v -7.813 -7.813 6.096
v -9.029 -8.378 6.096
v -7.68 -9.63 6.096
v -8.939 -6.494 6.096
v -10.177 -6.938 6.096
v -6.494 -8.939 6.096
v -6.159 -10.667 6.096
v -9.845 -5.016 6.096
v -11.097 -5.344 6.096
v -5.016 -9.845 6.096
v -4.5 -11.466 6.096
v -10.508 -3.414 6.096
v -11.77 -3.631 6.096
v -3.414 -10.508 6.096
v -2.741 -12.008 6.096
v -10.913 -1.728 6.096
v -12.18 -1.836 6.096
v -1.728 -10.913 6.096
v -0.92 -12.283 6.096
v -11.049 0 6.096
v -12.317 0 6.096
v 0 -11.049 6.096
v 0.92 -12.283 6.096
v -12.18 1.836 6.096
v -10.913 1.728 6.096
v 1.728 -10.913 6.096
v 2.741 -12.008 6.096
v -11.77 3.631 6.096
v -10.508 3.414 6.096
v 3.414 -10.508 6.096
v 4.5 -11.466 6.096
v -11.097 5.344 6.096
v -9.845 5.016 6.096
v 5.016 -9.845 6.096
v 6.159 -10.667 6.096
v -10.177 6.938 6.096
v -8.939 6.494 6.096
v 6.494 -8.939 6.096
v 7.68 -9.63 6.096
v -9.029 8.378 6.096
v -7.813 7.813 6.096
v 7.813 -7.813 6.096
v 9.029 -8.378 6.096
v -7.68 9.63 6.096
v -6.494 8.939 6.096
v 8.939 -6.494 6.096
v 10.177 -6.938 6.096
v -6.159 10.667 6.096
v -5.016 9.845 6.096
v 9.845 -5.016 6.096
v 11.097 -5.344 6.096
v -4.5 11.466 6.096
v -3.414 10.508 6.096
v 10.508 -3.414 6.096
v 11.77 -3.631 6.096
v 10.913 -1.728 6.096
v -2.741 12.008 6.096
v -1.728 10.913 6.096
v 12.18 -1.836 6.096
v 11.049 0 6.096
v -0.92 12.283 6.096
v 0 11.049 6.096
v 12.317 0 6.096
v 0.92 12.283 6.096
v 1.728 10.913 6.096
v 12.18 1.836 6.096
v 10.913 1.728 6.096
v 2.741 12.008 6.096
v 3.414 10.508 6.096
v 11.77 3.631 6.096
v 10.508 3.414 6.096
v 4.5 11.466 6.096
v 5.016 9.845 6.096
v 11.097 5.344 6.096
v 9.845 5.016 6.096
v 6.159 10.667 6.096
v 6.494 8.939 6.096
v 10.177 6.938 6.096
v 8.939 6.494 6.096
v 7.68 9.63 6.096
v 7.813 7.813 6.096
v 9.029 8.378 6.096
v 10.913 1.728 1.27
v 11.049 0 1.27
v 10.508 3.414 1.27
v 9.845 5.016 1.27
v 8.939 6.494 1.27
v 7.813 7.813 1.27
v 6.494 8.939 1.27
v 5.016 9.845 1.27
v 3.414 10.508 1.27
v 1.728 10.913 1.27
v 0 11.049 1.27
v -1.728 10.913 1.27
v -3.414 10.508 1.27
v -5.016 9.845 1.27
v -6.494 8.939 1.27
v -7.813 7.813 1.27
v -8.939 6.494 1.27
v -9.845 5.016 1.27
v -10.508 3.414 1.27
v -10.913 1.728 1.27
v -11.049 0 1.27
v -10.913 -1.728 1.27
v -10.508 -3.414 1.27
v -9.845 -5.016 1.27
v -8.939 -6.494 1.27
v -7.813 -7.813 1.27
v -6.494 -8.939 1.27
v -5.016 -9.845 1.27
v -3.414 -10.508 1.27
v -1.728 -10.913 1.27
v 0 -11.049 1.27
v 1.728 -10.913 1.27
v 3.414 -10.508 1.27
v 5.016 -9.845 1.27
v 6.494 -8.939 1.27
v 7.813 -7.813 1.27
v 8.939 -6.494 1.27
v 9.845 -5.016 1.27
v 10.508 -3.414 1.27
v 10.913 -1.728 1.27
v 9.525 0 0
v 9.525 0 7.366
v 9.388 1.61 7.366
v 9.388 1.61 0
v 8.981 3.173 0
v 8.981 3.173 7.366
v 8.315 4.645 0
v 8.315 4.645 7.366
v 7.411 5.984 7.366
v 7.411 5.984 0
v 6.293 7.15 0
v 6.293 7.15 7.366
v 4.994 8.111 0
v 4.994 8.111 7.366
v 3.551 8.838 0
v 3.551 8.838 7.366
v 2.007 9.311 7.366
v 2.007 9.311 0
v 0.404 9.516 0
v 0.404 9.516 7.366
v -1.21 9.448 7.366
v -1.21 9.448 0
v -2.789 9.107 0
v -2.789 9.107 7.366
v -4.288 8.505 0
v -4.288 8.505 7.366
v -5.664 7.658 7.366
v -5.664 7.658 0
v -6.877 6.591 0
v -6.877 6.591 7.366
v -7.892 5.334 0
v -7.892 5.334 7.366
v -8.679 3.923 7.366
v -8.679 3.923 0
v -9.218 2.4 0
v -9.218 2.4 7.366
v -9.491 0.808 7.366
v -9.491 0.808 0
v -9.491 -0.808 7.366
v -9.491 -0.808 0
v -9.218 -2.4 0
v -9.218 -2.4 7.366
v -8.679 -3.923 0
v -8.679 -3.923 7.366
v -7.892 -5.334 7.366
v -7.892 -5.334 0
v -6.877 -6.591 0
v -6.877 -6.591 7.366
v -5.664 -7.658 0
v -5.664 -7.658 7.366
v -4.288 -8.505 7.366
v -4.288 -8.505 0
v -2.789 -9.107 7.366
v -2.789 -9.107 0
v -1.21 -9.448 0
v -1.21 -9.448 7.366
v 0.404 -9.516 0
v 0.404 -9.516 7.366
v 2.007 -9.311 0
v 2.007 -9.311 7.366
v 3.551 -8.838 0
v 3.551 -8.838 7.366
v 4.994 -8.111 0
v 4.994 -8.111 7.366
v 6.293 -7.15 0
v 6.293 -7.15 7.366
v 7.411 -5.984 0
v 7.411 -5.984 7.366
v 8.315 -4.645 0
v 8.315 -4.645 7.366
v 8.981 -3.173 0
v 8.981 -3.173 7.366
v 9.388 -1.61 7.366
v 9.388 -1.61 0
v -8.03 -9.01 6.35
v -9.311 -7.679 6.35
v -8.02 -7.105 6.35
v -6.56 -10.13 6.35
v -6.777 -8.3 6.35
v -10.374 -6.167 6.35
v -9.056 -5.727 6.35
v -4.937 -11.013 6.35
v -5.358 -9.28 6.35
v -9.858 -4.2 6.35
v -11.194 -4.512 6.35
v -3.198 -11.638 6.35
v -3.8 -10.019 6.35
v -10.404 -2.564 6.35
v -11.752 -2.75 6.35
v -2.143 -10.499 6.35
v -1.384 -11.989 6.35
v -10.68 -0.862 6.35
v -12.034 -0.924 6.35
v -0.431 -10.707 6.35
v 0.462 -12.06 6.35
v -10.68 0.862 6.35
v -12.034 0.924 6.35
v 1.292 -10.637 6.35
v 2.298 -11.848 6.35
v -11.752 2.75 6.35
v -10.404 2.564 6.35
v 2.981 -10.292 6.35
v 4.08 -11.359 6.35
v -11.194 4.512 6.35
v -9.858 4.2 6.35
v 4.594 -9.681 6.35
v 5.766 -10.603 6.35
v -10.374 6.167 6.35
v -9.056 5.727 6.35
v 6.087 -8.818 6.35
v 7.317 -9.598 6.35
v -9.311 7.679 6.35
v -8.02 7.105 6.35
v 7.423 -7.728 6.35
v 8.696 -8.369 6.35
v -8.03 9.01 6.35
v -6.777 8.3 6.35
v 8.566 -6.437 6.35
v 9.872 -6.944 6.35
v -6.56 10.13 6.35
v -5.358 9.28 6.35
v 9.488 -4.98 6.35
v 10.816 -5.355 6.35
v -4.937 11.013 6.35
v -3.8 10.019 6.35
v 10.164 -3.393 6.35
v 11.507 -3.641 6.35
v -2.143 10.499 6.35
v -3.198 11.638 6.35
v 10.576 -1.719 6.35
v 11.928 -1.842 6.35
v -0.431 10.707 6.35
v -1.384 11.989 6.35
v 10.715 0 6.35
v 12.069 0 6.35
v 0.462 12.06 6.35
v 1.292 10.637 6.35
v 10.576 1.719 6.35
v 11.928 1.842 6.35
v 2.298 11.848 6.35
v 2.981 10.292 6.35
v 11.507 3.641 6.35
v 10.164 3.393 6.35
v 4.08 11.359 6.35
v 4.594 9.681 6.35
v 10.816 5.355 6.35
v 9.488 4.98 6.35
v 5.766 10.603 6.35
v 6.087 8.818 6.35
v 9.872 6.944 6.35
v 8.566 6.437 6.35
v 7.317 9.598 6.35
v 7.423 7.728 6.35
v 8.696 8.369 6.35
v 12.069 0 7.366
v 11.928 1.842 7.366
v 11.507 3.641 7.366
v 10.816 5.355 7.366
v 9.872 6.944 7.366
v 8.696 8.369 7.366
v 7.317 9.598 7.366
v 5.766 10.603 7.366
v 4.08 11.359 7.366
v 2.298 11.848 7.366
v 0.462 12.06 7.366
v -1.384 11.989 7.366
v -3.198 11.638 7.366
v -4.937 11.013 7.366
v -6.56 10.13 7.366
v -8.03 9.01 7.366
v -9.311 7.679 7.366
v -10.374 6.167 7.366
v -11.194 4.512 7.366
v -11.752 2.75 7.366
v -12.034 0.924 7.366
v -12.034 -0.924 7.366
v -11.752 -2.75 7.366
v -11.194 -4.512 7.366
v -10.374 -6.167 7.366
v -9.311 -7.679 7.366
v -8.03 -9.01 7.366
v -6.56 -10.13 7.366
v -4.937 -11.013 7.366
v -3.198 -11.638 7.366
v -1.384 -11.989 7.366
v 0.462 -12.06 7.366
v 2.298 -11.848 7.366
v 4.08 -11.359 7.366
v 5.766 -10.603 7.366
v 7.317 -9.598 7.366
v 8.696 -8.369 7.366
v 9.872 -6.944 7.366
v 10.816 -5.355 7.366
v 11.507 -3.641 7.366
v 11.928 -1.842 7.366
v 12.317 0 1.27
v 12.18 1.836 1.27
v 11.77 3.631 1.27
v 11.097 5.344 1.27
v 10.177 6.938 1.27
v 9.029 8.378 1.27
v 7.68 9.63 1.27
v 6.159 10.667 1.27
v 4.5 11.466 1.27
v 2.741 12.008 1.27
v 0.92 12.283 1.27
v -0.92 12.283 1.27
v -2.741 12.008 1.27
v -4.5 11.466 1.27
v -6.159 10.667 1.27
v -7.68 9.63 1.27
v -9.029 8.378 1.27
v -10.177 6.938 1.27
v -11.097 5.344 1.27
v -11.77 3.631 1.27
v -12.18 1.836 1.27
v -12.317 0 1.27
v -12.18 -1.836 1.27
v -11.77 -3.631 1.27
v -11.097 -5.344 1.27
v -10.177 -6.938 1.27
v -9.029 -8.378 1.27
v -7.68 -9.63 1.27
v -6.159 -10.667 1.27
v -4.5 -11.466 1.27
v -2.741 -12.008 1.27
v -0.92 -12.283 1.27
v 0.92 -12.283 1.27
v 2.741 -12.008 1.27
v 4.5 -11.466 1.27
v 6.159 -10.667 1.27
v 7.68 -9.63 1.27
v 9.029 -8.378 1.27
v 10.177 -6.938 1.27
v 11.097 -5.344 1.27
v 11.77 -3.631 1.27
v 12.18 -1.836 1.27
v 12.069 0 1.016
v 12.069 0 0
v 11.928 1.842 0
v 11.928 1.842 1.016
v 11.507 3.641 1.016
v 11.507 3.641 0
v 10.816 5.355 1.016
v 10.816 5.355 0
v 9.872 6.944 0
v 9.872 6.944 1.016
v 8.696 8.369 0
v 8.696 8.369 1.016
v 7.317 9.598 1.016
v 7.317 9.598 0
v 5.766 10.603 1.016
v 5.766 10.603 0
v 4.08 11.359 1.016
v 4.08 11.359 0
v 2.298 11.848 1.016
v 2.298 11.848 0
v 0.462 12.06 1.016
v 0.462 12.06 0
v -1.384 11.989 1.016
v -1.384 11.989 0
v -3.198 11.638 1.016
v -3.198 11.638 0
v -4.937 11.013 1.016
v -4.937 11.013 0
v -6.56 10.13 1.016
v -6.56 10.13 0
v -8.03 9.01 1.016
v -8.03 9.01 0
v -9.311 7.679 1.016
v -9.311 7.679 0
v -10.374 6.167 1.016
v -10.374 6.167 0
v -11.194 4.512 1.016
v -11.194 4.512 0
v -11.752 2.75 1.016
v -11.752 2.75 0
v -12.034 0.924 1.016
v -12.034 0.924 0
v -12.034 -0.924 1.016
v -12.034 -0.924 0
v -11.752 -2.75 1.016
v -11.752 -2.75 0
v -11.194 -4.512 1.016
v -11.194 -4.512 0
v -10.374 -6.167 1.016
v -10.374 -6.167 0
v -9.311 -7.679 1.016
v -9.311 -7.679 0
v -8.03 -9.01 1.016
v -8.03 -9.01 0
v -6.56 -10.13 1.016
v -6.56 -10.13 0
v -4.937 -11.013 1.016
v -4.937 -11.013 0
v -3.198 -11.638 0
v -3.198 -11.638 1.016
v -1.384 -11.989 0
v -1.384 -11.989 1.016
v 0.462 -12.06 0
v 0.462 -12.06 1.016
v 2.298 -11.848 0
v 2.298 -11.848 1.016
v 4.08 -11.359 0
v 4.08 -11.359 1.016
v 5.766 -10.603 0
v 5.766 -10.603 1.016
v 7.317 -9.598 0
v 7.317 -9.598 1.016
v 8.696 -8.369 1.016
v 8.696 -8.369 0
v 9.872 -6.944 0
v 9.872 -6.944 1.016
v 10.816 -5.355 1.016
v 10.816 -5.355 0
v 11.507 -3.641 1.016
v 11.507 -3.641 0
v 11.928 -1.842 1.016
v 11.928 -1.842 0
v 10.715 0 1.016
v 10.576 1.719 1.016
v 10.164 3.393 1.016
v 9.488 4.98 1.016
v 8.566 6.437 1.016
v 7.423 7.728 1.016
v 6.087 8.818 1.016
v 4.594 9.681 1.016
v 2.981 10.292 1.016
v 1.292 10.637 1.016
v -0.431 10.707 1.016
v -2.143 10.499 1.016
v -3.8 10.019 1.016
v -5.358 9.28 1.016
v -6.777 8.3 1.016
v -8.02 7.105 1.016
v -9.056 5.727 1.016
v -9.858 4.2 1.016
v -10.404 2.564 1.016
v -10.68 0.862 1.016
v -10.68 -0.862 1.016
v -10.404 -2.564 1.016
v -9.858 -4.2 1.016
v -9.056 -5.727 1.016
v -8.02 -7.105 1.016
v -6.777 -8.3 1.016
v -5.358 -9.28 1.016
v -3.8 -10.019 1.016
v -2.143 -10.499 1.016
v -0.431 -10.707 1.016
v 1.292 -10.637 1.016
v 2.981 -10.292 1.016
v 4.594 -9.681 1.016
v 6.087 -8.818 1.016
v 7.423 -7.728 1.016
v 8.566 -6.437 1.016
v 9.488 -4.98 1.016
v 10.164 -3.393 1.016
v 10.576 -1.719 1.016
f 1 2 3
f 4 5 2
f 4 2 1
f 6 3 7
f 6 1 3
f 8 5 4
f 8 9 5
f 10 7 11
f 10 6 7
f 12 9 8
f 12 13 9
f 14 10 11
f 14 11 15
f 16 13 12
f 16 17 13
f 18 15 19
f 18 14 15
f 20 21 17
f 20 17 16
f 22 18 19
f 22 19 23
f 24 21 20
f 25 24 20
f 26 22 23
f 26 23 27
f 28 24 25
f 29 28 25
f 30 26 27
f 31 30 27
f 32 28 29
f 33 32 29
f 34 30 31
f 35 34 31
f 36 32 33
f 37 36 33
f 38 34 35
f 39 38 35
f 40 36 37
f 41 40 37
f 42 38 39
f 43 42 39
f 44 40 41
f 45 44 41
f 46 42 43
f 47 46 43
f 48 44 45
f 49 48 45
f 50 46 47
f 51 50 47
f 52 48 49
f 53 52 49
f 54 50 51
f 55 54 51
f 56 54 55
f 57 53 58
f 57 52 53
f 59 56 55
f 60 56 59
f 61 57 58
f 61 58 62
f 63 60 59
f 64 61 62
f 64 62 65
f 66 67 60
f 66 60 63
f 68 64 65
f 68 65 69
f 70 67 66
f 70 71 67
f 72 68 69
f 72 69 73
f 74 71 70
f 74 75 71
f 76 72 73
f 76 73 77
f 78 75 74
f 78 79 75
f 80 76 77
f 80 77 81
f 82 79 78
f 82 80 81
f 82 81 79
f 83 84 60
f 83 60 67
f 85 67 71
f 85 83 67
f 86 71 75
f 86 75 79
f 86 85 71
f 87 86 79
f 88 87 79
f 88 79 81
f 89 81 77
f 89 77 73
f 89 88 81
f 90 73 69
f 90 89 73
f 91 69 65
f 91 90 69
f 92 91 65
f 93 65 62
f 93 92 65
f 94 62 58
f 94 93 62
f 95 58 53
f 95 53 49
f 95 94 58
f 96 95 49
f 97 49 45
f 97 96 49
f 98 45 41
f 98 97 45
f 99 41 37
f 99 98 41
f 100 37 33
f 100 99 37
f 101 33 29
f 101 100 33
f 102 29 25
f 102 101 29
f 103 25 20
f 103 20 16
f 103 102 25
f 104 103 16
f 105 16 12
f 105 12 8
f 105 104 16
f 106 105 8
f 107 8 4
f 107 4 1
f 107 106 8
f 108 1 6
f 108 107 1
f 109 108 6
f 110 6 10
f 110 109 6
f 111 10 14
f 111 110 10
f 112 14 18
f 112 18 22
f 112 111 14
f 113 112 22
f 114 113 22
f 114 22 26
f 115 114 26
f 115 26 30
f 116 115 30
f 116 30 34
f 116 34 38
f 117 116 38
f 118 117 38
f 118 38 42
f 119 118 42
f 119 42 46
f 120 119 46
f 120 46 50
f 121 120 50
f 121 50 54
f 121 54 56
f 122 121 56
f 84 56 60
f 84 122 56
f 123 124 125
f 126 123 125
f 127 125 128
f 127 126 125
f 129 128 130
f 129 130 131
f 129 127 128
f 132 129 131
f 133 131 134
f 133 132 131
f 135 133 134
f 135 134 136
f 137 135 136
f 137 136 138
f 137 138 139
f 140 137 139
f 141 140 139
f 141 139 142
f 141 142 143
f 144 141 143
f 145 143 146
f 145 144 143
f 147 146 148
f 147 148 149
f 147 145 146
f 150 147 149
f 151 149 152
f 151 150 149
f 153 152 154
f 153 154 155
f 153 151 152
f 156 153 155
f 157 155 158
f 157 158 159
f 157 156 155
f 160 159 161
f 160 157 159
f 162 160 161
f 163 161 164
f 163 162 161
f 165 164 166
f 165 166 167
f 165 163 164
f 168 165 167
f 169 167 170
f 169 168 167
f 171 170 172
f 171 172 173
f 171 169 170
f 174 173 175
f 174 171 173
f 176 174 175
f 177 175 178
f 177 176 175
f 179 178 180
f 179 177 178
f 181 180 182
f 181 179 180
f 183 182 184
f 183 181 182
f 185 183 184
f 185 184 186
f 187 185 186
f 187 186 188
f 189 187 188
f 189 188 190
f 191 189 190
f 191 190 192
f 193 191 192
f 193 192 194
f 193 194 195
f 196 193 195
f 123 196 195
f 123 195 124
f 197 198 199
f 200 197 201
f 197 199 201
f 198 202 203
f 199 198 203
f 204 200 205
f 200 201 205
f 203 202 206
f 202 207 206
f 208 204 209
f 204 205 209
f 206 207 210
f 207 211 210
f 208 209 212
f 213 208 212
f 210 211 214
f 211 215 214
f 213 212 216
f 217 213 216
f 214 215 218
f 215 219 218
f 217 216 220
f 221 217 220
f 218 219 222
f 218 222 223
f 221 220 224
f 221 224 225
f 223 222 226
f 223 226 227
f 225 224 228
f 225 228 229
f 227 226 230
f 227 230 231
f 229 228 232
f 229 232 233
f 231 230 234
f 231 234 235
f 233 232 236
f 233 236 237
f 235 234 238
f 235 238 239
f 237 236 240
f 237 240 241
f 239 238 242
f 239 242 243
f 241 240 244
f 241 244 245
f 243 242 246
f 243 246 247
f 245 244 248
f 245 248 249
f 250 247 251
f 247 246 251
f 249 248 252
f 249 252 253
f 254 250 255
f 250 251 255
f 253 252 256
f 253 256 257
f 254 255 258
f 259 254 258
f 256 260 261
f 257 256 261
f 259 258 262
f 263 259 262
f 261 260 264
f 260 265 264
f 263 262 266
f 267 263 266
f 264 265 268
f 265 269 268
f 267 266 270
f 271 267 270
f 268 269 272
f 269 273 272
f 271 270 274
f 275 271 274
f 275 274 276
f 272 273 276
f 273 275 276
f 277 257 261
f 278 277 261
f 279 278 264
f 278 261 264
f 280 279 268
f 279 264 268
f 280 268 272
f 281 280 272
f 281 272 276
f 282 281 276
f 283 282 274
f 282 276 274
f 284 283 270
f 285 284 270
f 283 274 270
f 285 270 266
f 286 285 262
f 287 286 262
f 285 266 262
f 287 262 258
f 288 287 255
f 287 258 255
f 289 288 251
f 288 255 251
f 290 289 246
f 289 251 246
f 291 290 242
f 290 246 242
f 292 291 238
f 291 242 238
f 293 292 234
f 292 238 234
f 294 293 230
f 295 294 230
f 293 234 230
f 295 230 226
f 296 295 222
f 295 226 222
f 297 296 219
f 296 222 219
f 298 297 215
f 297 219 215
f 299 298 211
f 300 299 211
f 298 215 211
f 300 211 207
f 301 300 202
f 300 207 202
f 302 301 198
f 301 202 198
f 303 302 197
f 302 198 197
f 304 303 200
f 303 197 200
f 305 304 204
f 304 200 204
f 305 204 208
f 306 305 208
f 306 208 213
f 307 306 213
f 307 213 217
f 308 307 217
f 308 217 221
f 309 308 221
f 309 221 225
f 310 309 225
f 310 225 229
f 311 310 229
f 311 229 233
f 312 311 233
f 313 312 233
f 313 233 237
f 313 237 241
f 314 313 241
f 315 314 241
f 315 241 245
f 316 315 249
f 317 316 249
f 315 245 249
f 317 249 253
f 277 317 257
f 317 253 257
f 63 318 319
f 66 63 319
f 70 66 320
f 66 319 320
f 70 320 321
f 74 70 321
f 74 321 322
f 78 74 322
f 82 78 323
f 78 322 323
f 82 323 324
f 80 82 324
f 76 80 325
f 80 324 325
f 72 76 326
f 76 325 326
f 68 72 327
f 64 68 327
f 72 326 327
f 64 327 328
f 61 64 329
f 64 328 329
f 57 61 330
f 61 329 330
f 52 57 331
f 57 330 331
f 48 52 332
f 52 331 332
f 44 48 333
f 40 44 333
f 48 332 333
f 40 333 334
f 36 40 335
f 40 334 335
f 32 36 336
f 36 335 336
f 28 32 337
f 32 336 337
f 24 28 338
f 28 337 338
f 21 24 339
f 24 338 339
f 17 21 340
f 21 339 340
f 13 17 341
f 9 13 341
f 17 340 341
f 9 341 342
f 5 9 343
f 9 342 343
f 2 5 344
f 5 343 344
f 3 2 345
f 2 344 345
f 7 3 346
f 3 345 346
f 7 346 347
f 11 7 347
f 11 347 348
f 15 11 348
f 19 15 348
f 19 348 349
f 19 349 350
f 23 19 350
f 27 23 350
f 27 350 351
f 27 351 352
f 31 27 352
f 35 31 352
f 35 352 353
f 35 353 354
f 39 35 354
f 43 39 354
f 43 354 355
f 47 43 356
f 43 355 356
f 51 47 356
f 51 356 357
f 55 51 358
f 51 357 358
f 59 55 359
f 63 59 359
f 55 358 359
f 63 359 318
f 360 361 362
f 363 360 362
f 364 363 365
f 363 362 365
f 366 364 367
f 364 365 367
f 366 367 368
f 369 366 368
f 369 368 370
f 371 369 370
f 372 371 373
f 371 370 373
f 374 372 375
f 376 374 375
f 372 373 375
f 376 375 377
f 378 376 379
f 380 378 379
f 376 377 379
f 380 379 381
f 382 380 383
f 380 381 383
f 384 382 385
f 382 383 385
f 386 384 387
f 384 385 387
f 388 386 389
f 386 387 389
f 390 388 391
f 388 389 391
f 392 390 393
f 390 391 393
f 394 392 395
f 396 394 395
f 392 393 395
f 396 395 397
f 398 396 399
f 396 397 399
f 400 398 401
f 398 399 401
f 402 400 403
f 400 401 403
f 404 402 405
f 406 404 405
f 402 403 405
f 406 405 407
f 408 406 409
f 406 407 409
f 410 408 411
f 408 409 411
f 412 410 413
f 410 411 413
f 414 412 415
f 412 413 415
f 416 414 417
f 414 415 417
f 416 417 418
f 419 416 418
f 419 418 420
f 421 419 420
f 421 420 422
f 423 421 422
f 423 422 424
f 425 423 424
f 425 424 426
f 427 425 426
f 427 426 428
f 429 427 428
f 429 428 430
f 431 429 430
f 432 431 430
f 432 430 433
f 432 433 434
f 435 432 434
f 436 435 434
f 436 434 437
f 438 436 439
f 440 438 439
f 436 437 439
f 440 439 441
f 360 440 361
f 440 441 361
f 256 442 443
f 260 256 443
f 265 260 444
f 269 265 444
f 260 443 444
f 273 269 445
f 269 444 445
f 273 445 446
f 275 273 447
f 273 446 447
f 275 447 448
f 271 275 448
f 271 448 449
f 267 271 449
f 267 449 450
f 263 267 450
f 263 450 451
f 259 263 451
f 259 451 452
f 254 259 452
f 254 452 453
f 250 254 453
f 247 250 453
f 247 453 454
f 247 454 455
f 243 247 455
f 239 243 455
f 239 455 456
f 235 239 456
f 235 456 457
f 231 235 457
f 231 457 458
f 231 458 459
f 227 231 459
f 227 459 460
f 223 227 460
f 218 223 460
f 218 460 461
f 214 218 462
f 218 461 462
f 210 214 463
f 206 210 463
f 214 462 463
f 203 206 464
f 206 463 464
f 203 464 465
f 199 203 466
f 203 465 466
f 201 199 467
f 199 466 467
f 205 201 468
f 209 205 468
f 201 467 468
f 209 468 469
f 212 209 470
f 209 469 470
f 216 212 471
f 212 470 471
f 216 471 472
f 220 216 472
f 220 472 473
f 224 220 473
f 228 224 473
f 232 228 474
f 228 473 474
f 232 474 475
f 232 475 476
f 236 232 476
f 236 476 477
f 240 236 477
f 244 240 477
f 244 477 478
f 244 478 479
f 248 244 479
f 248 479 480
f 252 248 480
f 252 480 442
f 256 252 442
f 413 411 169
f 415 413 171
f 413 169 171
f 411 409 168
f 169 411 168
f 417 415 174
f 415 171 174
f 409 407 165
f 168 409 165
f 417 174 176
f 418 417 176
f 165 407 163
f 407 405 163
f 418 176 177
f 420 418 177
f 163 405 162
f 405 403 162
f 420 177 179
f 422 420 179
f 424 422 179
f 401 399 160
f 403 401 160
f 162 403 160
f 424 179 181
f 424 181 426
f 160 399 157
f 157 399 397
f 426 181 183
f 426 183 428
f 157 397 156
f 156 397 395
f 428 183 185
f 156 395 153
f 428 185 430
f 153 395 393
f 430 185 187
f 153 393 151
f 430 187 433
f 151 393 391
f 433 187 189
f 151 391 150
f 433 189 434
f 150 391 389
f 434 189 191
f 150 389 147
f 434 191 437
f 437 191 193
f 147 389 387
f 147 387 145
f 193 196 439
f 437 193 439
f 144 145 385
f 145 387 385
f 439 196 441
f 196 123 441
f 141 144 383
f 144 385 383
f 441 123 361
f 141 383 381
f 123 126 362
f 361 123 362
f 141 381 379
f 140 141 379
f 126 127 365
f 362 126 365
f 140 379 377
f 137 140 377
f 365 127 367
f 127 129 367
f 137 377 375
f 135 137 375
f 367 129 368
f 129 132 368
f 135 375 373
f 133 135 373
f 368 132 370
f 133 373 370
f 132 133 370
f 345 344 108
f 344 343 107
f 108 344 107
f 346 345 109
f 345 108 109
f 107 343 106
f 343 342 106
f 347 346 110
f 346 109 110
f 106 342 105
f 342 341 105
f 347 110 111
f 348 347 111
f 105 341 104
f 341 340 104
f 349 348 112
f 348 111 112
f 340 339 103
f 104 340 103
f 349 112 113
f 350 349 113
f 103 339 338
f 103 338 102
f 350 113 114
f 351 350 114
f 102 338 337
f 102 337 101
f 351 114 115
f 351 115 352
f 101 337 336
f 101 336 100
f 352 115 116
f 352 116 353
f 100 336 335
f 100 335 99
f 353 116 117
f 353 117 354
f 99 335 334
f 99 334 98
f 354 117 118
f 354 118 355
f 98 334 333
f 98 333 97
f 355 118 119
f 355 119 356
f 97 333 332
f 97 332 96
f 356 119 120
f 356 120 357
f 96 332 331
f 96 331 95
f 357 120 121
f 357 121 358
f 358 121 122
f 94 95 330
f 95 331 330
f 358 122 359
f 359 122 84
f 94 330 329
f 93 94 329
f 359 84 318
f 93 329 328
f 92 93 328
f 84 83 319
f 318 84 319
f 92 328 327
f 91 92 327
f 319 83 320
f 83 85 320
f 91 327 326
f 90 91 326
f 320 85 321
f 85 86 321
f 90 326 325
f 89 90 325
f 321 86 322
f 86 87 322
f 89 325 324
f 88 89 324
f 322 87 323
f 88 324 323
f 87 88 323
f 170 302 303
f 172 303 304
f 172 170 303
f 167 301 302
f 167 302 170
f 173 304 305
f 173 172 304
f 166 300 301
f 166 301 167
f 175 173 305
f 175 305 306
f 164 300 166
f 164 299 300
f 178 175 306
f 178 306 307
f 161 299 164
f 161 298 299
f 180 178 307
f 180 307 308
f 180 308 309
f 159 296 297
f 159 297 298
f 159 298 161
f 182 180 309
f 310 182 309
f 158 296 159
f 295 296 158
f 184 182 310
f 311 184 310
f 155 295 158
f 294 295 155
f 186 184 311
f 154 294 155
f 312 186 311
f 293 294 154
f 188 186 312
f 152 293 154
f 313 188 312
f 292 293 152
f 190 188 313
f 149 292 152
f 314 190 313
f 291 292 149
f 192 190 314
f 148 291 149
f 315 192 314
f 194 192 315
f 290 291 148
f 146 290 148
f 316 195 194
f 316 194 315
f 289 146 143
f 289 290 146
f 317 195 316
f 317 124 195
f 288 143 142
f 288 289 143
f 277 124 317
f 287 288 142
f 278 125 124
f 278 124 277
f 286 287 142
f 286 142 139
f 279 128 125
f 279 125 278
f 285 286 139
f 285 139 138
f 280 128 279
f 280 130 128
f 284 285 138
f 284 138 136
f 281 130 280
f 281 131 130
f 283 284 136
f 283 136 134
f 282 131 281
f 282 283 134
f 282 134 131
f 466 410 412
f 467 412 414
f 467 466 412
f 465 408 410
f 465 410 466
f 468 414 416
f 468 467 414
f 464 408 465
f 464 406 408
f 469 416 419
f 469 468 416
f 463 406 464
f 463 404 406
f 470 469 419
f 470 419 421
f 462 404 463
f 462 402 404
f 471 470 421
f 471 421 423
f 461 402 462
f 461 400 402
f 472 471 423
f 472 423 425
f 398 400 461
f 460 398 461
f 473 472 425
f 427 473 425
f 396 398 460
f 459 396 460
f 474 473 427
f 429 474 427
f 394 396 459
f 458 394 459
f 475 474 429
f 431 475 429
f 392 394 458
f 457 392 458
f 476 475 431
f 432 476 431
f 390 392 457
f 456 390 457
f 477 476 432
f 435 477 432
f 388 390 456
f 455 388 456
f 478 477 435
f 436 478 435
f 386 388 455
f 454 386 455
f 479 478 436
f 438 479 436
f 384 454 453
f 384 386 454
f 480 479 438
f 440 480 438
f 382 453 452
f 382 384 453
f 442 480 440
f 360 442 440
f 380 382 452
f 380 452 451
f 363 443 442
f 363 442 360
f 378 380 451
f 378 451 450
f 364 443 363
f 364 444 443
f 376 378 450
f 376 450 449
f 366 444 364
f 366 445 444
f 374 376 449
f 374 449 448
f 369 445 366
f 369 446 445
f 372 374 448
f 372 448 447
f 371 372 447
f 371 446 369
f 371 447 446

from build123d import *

# Parameters (mm, degrees)
F0_R     = 10.7152116662
F0_R_2   = 9.525
F1_DEPTH = 7.366
F0_R_3   = 12.0690039206
F2_DEPTH = 1.016
F3_START = 6.35
F3_DEPTH = 1.016
F5_START = 0.254
F4_R     = 12.3171181136
F4_R_2   = 11.049
F5_DEPTH = 4.826


with BuildPart() as f1:
    # F0 (on Top) → F1 (new body)
    with BuildSketch(Plane.XY):
        Circle(F0_R)
        Circle(F0_R_2, mode=Mode.SUBTRACT)
    extrude(amount=F1_DEPTH)

    # F0 (on Top) → F2 (join)
    with BuildSketch(Plane.XY):
        Circle(F0_R_3)
        Circle(F0_R, mode=Mode.SUBTRACT)
    extrude(amount=F2_DEPTH)

    # F0 (on Top) → F3 (join)
    with BuildSketch(Plane.XY.offset(F3_START)):
        Circle(F0_R_3)
        Circle(F0_R, mode=Mode.SUBTRACT)
    extrude(amount=F3_DEPTH)


with BuildPart() as f5:
    # F4 (on face) → F5 (new body)
    with BuildSketch(Plane.XY.offset(1.016).offset(F5_START)):
        Circle(F4_R)
        Circle(F4_R_2, mode=Mode.SUBTRACT)
    extrude(amount=F5_DEPTH)


solid = Compound([f1.part, f5.part])
